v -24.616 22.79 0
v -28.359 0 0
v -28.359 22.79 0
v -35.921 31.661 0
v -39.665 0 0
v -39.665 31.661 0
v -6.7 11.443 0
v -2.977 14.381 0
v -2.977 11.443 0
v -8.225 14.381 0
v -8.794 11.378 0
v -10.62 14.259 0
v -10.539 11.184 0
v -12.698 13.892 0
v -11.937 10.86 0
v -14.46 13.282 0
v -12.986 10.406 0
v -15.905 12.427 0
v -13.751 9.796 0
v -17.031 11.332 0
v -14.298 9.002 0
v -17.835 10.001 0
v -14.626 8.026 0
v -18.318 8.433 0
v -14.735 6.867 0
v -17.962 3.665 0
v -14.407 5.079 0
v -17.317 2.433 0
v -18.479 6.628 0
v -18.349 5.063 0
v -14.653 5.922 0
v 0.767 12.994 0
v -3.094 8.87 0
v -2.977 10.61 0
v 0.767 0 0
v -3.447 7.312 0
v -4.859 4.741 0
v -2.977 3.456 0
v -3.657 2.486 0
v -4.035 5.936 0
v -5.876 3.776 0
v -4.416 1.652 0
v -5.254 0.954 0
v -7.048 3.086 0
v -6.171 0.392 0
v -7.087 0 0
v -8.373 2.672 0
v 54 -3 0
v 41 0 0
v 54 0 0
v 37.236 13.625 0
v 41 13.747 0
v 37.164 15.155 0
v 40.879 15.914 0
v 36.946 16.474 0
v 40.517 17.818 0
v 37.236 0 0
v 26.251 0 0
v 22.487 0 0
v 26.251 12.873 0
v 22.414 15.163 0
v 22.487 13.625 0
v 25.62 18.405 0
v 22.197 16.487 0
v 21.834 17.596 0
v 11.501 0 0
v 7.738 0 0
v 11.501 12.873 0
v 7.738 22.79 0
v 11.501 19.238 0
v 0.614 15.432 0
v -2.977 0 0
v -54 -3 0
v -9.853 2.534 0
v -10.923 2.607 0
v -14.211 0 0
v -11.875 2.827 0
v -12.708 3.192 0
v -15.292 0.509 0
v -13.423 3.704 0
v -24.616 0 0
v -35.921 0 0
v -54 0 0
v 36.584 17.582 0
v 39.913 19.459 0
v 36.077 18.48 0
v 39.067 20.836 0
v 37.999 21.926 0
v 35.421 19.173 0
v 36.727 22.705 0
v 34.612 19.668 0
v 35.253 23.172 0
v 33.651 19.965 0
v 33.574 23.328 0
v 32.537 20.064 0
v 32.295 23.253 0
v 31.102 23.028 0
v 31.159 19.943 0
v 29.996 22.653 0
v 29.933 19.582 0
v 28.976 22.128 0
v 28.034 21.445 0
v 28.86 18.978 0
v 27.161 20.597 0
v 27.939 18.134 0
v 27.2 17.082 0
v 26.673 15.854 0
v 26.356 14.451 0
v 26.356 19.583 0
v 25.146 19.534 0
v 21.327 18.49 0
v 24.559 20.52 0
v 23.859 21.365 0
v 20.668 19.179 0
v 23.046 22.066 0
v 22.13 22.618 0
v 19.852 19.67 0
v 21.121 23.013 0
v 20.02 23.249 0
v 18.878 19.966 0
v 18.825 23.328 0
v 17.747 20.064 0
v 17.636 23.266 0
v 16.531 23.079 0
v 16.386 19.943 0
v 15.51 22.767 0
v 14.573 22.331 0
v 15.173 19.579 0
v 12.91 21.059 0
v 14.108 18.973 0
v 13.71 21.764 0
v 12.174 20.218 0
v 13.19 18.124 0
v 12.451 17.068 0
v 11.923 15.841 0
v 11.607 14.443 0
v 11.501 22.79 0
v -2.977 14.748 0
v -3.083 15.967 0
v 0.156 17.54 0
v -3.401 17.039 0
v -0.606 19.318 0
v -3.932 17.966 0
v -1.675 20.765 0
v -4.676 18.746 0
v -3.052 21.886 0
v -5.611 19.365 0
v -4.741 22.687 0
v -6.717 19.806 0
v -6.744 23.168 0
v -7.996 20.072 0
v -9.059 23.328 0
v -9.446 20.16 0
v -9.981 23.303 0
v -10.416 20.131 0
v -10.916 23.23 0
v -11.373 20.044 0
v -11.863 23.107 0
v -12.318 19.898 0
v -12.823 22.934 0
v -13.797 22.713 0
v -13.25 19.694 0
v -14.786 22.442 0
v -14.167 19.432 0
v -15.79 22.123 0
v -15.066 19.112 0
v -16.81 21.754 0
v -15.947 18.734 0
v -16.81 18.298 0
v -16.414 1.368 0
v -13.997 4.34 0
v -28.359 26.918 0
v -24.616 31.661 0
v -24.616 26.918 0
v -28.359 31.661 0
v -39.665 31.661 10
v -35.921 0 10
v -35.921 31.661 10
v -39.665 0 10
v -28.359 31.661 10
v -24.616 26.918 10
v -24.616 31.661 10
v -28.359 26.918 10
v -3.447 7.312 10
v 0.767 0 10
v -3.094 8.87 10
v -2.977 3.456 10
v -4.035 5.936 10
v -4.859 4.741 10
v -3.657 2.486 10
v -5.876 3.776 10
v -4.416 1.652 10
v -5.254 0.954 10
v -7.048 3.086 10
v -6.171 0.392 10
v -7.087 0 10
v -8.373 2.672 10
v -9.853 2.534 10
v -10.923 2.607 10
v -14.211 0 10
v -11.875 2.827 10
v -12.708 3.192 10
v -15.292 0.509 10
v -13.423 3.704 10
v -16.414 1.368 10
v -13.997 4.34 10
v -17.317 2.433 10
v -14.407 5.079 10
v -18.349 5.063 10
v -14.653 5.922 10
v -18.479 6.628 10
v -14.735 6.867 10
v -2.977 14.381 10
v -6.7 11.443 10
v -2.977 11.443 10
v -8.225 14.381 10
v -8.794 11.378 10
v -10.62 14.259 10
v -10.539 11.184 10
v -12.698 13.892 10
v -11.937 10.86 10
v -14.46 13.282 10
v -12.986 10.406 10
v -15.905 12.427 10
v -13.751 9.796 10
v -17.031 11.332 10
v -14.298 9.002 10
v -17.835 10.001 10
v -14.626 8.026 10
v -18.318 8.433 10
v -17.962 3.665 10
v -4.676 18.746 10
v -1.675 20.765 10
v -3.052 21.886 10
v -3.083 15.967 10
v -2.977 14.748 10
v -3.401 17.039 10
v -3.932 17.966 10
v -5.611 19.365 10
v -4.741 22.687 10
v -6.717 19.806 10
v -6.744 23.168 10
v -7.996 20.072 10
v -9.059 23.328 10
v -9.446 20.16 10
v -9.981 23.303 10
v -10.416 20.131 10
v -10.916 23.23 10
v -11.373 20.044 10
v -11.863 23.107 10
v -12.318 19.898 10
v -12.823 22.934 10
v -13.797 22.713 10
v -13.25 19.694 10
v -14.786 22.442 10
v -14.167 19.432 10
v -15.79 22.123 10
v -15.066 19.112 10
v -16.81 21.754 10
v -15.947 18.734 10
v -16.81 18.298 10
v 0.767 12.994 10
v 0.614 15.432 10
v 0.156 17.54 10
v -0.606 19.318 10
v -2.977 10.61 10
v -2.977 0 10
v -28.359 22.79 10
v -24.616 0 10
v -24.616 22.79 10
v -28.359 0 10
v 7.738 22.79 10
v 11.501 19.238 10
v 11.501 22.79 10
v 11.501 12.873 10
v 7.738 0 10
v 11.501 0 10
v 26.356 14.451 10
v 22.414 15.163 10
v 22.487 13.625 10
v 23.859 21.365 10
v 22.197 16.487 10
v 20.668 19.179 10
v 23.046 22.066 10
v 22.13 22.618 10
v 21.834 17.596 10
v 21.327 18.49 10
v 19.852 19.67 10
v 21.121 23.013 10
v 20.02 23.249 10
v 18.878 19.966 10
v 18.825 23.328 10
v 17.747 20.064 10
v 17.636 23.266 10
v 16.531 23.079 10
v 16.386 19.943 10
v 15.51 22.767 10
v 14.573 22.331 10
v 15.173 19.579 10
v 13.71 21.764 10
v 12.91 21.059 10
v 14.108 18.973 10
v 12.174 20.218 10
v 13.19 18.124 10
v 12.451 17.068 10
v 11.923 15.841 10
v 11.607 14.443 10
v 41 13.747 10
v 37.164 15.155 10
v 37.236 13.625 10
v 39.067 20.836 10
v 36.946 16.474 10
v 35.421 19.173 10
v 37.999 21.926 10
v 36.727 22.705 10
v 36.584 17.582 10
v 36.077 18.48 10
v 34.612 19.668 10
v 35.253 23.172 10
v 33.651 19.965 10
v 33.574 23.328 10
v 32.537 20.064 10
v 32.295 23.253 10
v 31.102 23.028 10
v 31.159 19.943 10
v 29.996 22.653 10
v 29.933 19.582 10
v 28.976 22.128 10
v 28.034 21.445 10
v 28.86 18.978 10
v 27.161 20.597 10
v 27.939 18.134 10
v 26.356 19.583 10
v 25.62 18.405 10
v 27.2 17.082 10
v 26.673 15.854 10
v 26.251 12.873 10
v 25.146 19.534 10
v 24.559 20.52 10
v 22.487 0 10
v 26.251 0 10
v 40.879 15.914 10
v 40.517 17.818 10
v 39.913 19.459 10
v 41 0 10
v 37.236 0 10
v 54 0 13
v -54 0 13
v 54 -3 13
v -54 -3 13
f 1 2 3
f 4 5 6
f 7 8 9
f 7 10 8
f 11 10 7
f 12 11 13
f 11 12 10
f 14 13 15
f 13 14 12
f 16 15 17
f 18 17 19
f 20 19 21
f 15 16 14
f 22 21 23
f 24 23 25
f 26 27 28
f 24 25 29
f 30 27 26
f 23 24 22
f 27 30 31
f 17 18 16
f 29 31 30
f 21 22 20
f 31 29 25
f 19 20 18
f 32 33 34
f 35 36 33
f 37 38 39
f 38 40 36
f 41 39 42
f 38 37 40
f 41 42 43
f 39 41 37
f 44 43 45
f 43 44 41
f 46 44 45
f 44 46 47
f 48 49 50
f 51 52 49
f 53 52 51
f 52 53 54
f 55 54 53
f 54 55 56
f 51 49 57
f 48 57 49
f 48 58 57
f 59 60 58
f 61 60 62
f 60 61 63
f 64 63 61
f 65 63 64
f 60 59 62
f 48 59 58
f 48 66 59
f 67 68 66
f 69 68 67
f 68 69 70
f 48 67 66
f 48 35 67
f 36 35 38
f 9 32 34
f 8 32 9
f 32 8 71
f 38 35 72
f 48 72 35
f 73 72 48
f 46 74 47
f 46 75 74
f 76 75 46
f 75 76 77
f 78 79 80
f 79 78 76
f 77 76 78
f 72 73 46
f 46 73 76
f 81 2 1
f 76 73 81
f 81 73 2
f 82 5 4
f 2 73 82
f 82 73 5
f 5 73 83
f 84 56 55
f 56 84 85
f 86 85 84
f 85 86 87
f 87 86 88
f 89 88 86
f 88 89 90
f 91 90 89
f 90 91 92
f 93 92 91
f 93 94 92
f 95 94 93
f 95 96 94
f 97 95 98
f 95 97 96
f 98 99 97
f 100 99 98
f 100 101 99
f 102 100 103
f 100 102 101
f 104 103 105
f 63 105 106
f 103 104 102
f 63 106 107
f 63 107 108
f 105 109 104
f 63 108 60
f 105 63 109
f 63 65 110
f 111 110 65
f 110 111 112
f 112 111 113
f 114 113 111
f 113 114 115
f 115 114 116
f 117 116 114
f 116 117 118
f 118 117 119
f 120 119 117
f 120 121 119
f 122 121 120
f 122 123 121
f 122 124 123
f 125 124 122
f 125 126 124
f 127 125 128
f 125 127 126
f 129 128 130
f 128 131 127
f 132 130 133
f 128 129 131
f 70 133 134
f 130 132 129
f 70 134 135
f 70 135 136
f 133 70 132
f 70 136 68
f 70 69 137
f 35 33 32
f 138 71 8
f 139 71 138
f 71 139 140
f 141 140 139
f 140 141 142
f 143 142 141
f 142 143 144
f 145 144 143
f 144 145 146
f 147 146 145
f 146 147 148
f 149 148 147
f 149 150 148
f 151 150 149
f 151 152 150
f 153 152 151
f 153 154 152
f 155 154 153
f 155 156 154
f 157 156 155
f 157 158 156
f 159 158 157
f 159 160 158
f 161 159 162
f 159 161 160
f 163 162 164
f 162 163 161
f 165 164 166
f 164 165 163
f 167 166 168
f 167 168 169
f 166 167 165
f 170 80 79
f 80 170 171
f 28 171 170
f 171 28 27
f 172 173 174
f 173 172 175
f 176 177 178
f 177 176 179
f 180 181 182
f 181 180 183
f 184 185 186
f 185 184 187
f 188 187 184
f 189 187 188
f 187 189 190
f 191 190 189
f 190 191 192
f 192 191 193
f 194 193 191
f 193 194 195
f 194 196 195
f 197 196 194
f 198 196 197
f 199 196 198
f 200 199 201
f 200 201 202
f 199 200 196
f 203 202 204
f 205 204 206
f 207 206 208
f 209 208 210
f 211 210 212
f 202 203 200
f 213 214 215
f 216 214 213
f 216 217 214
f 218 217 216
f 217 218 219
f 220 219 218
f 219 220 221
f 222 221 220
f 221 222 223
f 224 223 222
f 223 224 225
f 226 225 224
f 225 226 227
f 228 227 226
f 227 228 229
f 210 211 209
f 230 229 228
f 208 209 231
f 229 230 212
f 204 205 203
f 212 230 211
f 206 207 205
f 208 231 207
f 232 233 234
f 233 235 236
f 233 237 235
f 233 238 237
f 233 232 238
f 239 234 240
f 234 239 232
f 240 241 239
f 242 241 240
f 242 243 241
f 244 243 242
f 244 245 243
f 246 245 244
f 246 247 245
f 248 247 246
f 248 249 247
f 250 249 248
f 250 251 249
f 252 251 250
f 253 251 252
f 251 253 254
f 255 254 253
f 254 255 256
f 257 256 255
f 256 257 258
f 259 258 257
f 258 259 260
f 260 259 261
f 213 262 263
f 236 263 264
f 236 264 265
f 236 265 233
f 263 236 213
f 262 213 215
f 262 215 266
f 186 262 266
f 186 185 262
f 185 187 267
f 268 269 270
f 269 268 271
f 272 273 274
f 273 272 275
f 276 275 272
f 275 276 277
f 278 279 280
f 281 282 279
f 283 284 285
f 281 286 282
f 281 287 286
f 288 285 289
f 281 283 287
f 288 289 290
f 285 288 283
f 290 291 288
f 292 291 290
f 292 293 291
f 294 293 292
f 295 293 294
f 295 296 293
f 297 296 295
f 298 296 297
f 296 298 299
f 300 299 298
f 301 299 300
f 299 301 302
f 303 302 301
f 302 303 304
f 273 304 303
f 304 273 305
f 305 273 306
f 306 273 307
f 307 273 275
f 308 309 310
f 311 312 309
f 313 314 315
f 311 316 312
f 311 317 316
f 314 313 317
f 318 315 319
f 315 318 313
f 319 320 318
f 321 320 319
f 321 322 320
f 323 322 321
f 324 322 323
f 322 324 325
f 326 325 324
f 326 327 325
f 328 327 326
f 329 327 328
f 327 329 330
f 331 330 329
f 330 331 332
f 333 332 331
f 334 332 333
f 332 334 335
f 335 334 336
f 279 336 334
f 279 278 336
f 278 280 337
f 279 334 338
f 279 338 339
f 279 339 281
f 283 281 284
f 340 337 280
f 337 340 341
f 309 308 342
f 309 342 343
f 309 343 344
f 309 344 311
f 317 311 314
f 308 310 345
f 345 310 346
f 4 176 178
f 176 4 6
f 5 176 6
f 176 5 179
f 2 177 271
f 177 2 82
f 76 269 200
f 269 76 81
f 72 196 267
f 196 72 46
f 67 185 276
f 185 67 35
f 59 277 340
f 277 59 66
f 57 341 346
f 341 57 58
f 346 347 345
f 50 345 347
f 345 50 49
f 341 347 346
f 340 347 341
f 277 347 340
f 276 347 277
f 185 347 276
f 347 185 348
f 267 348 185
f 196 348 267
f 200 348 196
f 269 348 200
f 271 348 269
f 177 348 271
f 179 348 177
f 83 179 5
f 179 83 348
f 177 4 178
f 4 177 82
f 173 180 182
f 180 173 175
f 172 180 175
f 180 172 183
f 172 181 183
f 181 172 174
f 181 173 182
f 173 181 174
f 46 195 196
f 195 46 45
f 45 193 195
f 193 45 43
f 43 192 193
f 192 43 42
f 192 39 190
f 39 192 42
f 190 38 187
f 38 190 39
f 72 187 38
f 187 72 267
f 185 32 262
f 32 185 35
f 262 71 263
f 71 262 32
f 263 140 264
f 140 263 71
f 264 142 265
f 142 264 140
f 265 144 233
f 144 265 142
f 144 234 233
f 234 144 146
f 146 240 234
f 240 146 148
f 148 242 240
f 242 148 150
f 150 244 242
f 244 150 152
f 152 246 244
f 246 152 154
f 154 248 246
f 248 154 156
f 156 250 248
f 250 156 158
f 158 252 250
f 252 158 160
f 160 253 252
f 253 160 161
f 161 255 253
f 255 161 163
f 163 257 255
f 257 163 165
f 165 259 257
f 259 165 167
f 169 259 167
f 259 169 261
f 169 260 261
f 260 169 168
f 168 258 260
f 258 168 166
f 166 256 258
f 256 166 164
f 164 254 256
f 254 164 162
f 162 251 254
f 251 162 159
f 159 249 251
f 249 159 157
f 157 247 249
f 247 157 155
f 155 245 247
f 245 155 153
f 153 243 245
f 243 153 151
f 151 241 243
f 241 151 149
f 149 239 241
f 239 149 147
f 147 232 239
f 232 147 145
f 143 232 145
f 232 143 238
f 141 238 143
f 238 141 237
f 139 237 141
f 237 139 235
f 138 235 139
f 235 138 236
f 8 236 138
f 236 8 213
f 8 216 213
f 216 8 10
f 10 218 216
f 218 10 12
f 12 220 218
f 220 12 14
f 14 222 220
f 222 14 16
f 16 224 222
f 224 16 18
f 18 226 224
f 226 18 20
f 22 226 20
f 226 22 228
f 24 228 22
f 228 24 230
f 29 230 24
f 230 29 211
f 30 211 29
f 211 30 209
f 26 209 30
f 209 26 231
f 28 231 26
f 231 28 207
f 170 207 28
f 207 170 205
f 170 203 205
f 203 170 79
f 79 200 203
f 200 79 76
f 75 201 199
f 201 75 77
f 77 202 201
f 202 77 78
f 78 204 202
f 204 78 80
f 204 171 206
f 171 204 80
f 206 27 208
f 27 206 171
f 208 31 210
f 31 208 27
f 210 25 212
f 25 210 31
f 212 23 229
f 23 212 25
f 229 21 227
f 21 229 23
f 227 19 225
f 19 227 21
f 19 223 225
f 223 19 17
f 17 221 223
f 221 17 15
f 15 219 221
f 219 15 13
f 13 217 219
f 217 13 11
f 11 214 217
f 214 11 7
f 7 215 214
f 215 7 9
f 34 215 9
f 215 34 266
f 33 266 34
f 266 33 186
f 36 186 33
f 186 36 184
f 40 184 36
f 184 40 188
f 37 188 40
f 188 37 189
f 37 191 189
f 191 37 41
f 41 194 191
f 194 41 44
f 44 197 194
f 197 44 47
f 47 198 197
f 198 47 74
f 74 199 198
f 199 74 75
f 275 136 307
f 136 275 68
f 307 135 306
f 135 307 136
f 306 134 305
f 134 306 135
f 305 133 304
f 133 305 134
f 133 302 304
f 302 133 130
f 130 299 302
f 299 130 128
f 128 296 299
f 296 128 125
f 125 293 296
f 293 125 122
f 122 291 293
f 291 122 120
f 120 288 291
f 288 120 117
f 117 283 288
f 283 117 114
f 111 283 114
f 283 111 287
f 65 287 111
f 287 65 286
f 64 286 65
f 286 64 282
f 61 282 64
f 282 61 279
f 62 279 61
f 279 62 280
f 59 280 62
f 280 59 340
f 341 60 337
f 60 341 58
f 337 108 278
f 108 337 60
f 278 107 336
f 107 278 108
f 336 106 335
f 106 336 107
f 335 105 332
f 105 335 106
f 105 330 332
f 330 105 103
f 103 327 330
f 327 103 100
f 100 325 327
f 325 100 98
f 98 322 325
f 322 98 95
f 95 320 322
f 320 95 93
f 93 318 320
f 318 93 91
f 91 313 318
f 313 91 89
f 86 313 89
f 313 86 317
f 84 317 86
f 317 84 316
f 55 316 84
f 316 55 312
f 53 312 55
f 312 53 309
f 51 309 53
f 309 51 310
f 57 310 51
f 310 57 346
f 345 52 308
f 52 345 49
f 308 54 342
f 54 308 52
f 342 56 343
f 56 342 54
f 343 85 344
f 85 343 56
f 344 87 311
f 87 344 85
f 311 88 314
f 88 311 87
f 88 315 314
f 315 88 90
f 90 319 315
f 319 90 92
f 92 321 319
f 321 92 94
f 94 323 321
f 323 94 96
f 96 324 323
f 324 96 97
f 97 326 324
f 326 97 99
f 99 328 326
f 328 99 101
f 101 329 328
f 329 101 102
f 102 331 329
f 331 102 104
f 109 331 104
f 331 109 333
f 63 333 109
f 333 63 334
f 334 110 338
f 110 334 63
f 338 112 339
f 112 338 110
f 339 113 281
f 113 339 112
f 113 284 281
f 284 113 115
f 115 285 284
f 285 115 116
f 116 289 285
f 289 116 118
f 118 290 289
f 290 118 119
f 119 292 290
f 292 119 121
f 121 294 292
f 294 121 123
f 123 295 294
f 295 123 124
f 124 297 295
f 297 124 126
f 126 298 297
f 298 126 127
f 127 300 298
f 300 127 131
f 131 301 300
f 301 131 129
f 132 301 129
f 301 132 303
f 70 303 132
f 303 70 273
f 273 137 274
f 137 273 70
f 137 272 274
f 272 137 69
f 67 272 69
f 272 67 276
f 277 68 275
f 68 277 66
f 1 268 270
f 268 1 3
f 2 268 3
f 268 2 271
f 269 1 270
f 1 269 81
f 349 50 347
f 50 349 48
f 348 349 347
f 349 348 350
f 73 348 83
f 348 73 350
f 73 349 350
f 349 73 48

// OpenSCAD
// file: Minecraft_Name.scad
module Minecraft_Name(text, font_size=30, extrude_height=10, extra_base=3, adjust_base_width=0, texture_width=1.6, texture_depth=0.4)
{
    nb_char = len(text);
    color("LimeGreen")
    
    union() {
        linear_extrude(height=extrude_height)
          text(text=text, size=font_size, font="Minecrafter", halign="center");
        translate([0, -extra_base/2, (extrude_height+extra_base)/2])
          cube(size=[nb_char*font_size+adjust_base_width, extra_base, extrude_height+extra_base], center=true);
    }
}
// main file
use <Minecraft_Name.scad>;

Minecraft_Name("liam", font_size=30, extra_base=3, adjust_base_width=-12, texture_depth=0);
